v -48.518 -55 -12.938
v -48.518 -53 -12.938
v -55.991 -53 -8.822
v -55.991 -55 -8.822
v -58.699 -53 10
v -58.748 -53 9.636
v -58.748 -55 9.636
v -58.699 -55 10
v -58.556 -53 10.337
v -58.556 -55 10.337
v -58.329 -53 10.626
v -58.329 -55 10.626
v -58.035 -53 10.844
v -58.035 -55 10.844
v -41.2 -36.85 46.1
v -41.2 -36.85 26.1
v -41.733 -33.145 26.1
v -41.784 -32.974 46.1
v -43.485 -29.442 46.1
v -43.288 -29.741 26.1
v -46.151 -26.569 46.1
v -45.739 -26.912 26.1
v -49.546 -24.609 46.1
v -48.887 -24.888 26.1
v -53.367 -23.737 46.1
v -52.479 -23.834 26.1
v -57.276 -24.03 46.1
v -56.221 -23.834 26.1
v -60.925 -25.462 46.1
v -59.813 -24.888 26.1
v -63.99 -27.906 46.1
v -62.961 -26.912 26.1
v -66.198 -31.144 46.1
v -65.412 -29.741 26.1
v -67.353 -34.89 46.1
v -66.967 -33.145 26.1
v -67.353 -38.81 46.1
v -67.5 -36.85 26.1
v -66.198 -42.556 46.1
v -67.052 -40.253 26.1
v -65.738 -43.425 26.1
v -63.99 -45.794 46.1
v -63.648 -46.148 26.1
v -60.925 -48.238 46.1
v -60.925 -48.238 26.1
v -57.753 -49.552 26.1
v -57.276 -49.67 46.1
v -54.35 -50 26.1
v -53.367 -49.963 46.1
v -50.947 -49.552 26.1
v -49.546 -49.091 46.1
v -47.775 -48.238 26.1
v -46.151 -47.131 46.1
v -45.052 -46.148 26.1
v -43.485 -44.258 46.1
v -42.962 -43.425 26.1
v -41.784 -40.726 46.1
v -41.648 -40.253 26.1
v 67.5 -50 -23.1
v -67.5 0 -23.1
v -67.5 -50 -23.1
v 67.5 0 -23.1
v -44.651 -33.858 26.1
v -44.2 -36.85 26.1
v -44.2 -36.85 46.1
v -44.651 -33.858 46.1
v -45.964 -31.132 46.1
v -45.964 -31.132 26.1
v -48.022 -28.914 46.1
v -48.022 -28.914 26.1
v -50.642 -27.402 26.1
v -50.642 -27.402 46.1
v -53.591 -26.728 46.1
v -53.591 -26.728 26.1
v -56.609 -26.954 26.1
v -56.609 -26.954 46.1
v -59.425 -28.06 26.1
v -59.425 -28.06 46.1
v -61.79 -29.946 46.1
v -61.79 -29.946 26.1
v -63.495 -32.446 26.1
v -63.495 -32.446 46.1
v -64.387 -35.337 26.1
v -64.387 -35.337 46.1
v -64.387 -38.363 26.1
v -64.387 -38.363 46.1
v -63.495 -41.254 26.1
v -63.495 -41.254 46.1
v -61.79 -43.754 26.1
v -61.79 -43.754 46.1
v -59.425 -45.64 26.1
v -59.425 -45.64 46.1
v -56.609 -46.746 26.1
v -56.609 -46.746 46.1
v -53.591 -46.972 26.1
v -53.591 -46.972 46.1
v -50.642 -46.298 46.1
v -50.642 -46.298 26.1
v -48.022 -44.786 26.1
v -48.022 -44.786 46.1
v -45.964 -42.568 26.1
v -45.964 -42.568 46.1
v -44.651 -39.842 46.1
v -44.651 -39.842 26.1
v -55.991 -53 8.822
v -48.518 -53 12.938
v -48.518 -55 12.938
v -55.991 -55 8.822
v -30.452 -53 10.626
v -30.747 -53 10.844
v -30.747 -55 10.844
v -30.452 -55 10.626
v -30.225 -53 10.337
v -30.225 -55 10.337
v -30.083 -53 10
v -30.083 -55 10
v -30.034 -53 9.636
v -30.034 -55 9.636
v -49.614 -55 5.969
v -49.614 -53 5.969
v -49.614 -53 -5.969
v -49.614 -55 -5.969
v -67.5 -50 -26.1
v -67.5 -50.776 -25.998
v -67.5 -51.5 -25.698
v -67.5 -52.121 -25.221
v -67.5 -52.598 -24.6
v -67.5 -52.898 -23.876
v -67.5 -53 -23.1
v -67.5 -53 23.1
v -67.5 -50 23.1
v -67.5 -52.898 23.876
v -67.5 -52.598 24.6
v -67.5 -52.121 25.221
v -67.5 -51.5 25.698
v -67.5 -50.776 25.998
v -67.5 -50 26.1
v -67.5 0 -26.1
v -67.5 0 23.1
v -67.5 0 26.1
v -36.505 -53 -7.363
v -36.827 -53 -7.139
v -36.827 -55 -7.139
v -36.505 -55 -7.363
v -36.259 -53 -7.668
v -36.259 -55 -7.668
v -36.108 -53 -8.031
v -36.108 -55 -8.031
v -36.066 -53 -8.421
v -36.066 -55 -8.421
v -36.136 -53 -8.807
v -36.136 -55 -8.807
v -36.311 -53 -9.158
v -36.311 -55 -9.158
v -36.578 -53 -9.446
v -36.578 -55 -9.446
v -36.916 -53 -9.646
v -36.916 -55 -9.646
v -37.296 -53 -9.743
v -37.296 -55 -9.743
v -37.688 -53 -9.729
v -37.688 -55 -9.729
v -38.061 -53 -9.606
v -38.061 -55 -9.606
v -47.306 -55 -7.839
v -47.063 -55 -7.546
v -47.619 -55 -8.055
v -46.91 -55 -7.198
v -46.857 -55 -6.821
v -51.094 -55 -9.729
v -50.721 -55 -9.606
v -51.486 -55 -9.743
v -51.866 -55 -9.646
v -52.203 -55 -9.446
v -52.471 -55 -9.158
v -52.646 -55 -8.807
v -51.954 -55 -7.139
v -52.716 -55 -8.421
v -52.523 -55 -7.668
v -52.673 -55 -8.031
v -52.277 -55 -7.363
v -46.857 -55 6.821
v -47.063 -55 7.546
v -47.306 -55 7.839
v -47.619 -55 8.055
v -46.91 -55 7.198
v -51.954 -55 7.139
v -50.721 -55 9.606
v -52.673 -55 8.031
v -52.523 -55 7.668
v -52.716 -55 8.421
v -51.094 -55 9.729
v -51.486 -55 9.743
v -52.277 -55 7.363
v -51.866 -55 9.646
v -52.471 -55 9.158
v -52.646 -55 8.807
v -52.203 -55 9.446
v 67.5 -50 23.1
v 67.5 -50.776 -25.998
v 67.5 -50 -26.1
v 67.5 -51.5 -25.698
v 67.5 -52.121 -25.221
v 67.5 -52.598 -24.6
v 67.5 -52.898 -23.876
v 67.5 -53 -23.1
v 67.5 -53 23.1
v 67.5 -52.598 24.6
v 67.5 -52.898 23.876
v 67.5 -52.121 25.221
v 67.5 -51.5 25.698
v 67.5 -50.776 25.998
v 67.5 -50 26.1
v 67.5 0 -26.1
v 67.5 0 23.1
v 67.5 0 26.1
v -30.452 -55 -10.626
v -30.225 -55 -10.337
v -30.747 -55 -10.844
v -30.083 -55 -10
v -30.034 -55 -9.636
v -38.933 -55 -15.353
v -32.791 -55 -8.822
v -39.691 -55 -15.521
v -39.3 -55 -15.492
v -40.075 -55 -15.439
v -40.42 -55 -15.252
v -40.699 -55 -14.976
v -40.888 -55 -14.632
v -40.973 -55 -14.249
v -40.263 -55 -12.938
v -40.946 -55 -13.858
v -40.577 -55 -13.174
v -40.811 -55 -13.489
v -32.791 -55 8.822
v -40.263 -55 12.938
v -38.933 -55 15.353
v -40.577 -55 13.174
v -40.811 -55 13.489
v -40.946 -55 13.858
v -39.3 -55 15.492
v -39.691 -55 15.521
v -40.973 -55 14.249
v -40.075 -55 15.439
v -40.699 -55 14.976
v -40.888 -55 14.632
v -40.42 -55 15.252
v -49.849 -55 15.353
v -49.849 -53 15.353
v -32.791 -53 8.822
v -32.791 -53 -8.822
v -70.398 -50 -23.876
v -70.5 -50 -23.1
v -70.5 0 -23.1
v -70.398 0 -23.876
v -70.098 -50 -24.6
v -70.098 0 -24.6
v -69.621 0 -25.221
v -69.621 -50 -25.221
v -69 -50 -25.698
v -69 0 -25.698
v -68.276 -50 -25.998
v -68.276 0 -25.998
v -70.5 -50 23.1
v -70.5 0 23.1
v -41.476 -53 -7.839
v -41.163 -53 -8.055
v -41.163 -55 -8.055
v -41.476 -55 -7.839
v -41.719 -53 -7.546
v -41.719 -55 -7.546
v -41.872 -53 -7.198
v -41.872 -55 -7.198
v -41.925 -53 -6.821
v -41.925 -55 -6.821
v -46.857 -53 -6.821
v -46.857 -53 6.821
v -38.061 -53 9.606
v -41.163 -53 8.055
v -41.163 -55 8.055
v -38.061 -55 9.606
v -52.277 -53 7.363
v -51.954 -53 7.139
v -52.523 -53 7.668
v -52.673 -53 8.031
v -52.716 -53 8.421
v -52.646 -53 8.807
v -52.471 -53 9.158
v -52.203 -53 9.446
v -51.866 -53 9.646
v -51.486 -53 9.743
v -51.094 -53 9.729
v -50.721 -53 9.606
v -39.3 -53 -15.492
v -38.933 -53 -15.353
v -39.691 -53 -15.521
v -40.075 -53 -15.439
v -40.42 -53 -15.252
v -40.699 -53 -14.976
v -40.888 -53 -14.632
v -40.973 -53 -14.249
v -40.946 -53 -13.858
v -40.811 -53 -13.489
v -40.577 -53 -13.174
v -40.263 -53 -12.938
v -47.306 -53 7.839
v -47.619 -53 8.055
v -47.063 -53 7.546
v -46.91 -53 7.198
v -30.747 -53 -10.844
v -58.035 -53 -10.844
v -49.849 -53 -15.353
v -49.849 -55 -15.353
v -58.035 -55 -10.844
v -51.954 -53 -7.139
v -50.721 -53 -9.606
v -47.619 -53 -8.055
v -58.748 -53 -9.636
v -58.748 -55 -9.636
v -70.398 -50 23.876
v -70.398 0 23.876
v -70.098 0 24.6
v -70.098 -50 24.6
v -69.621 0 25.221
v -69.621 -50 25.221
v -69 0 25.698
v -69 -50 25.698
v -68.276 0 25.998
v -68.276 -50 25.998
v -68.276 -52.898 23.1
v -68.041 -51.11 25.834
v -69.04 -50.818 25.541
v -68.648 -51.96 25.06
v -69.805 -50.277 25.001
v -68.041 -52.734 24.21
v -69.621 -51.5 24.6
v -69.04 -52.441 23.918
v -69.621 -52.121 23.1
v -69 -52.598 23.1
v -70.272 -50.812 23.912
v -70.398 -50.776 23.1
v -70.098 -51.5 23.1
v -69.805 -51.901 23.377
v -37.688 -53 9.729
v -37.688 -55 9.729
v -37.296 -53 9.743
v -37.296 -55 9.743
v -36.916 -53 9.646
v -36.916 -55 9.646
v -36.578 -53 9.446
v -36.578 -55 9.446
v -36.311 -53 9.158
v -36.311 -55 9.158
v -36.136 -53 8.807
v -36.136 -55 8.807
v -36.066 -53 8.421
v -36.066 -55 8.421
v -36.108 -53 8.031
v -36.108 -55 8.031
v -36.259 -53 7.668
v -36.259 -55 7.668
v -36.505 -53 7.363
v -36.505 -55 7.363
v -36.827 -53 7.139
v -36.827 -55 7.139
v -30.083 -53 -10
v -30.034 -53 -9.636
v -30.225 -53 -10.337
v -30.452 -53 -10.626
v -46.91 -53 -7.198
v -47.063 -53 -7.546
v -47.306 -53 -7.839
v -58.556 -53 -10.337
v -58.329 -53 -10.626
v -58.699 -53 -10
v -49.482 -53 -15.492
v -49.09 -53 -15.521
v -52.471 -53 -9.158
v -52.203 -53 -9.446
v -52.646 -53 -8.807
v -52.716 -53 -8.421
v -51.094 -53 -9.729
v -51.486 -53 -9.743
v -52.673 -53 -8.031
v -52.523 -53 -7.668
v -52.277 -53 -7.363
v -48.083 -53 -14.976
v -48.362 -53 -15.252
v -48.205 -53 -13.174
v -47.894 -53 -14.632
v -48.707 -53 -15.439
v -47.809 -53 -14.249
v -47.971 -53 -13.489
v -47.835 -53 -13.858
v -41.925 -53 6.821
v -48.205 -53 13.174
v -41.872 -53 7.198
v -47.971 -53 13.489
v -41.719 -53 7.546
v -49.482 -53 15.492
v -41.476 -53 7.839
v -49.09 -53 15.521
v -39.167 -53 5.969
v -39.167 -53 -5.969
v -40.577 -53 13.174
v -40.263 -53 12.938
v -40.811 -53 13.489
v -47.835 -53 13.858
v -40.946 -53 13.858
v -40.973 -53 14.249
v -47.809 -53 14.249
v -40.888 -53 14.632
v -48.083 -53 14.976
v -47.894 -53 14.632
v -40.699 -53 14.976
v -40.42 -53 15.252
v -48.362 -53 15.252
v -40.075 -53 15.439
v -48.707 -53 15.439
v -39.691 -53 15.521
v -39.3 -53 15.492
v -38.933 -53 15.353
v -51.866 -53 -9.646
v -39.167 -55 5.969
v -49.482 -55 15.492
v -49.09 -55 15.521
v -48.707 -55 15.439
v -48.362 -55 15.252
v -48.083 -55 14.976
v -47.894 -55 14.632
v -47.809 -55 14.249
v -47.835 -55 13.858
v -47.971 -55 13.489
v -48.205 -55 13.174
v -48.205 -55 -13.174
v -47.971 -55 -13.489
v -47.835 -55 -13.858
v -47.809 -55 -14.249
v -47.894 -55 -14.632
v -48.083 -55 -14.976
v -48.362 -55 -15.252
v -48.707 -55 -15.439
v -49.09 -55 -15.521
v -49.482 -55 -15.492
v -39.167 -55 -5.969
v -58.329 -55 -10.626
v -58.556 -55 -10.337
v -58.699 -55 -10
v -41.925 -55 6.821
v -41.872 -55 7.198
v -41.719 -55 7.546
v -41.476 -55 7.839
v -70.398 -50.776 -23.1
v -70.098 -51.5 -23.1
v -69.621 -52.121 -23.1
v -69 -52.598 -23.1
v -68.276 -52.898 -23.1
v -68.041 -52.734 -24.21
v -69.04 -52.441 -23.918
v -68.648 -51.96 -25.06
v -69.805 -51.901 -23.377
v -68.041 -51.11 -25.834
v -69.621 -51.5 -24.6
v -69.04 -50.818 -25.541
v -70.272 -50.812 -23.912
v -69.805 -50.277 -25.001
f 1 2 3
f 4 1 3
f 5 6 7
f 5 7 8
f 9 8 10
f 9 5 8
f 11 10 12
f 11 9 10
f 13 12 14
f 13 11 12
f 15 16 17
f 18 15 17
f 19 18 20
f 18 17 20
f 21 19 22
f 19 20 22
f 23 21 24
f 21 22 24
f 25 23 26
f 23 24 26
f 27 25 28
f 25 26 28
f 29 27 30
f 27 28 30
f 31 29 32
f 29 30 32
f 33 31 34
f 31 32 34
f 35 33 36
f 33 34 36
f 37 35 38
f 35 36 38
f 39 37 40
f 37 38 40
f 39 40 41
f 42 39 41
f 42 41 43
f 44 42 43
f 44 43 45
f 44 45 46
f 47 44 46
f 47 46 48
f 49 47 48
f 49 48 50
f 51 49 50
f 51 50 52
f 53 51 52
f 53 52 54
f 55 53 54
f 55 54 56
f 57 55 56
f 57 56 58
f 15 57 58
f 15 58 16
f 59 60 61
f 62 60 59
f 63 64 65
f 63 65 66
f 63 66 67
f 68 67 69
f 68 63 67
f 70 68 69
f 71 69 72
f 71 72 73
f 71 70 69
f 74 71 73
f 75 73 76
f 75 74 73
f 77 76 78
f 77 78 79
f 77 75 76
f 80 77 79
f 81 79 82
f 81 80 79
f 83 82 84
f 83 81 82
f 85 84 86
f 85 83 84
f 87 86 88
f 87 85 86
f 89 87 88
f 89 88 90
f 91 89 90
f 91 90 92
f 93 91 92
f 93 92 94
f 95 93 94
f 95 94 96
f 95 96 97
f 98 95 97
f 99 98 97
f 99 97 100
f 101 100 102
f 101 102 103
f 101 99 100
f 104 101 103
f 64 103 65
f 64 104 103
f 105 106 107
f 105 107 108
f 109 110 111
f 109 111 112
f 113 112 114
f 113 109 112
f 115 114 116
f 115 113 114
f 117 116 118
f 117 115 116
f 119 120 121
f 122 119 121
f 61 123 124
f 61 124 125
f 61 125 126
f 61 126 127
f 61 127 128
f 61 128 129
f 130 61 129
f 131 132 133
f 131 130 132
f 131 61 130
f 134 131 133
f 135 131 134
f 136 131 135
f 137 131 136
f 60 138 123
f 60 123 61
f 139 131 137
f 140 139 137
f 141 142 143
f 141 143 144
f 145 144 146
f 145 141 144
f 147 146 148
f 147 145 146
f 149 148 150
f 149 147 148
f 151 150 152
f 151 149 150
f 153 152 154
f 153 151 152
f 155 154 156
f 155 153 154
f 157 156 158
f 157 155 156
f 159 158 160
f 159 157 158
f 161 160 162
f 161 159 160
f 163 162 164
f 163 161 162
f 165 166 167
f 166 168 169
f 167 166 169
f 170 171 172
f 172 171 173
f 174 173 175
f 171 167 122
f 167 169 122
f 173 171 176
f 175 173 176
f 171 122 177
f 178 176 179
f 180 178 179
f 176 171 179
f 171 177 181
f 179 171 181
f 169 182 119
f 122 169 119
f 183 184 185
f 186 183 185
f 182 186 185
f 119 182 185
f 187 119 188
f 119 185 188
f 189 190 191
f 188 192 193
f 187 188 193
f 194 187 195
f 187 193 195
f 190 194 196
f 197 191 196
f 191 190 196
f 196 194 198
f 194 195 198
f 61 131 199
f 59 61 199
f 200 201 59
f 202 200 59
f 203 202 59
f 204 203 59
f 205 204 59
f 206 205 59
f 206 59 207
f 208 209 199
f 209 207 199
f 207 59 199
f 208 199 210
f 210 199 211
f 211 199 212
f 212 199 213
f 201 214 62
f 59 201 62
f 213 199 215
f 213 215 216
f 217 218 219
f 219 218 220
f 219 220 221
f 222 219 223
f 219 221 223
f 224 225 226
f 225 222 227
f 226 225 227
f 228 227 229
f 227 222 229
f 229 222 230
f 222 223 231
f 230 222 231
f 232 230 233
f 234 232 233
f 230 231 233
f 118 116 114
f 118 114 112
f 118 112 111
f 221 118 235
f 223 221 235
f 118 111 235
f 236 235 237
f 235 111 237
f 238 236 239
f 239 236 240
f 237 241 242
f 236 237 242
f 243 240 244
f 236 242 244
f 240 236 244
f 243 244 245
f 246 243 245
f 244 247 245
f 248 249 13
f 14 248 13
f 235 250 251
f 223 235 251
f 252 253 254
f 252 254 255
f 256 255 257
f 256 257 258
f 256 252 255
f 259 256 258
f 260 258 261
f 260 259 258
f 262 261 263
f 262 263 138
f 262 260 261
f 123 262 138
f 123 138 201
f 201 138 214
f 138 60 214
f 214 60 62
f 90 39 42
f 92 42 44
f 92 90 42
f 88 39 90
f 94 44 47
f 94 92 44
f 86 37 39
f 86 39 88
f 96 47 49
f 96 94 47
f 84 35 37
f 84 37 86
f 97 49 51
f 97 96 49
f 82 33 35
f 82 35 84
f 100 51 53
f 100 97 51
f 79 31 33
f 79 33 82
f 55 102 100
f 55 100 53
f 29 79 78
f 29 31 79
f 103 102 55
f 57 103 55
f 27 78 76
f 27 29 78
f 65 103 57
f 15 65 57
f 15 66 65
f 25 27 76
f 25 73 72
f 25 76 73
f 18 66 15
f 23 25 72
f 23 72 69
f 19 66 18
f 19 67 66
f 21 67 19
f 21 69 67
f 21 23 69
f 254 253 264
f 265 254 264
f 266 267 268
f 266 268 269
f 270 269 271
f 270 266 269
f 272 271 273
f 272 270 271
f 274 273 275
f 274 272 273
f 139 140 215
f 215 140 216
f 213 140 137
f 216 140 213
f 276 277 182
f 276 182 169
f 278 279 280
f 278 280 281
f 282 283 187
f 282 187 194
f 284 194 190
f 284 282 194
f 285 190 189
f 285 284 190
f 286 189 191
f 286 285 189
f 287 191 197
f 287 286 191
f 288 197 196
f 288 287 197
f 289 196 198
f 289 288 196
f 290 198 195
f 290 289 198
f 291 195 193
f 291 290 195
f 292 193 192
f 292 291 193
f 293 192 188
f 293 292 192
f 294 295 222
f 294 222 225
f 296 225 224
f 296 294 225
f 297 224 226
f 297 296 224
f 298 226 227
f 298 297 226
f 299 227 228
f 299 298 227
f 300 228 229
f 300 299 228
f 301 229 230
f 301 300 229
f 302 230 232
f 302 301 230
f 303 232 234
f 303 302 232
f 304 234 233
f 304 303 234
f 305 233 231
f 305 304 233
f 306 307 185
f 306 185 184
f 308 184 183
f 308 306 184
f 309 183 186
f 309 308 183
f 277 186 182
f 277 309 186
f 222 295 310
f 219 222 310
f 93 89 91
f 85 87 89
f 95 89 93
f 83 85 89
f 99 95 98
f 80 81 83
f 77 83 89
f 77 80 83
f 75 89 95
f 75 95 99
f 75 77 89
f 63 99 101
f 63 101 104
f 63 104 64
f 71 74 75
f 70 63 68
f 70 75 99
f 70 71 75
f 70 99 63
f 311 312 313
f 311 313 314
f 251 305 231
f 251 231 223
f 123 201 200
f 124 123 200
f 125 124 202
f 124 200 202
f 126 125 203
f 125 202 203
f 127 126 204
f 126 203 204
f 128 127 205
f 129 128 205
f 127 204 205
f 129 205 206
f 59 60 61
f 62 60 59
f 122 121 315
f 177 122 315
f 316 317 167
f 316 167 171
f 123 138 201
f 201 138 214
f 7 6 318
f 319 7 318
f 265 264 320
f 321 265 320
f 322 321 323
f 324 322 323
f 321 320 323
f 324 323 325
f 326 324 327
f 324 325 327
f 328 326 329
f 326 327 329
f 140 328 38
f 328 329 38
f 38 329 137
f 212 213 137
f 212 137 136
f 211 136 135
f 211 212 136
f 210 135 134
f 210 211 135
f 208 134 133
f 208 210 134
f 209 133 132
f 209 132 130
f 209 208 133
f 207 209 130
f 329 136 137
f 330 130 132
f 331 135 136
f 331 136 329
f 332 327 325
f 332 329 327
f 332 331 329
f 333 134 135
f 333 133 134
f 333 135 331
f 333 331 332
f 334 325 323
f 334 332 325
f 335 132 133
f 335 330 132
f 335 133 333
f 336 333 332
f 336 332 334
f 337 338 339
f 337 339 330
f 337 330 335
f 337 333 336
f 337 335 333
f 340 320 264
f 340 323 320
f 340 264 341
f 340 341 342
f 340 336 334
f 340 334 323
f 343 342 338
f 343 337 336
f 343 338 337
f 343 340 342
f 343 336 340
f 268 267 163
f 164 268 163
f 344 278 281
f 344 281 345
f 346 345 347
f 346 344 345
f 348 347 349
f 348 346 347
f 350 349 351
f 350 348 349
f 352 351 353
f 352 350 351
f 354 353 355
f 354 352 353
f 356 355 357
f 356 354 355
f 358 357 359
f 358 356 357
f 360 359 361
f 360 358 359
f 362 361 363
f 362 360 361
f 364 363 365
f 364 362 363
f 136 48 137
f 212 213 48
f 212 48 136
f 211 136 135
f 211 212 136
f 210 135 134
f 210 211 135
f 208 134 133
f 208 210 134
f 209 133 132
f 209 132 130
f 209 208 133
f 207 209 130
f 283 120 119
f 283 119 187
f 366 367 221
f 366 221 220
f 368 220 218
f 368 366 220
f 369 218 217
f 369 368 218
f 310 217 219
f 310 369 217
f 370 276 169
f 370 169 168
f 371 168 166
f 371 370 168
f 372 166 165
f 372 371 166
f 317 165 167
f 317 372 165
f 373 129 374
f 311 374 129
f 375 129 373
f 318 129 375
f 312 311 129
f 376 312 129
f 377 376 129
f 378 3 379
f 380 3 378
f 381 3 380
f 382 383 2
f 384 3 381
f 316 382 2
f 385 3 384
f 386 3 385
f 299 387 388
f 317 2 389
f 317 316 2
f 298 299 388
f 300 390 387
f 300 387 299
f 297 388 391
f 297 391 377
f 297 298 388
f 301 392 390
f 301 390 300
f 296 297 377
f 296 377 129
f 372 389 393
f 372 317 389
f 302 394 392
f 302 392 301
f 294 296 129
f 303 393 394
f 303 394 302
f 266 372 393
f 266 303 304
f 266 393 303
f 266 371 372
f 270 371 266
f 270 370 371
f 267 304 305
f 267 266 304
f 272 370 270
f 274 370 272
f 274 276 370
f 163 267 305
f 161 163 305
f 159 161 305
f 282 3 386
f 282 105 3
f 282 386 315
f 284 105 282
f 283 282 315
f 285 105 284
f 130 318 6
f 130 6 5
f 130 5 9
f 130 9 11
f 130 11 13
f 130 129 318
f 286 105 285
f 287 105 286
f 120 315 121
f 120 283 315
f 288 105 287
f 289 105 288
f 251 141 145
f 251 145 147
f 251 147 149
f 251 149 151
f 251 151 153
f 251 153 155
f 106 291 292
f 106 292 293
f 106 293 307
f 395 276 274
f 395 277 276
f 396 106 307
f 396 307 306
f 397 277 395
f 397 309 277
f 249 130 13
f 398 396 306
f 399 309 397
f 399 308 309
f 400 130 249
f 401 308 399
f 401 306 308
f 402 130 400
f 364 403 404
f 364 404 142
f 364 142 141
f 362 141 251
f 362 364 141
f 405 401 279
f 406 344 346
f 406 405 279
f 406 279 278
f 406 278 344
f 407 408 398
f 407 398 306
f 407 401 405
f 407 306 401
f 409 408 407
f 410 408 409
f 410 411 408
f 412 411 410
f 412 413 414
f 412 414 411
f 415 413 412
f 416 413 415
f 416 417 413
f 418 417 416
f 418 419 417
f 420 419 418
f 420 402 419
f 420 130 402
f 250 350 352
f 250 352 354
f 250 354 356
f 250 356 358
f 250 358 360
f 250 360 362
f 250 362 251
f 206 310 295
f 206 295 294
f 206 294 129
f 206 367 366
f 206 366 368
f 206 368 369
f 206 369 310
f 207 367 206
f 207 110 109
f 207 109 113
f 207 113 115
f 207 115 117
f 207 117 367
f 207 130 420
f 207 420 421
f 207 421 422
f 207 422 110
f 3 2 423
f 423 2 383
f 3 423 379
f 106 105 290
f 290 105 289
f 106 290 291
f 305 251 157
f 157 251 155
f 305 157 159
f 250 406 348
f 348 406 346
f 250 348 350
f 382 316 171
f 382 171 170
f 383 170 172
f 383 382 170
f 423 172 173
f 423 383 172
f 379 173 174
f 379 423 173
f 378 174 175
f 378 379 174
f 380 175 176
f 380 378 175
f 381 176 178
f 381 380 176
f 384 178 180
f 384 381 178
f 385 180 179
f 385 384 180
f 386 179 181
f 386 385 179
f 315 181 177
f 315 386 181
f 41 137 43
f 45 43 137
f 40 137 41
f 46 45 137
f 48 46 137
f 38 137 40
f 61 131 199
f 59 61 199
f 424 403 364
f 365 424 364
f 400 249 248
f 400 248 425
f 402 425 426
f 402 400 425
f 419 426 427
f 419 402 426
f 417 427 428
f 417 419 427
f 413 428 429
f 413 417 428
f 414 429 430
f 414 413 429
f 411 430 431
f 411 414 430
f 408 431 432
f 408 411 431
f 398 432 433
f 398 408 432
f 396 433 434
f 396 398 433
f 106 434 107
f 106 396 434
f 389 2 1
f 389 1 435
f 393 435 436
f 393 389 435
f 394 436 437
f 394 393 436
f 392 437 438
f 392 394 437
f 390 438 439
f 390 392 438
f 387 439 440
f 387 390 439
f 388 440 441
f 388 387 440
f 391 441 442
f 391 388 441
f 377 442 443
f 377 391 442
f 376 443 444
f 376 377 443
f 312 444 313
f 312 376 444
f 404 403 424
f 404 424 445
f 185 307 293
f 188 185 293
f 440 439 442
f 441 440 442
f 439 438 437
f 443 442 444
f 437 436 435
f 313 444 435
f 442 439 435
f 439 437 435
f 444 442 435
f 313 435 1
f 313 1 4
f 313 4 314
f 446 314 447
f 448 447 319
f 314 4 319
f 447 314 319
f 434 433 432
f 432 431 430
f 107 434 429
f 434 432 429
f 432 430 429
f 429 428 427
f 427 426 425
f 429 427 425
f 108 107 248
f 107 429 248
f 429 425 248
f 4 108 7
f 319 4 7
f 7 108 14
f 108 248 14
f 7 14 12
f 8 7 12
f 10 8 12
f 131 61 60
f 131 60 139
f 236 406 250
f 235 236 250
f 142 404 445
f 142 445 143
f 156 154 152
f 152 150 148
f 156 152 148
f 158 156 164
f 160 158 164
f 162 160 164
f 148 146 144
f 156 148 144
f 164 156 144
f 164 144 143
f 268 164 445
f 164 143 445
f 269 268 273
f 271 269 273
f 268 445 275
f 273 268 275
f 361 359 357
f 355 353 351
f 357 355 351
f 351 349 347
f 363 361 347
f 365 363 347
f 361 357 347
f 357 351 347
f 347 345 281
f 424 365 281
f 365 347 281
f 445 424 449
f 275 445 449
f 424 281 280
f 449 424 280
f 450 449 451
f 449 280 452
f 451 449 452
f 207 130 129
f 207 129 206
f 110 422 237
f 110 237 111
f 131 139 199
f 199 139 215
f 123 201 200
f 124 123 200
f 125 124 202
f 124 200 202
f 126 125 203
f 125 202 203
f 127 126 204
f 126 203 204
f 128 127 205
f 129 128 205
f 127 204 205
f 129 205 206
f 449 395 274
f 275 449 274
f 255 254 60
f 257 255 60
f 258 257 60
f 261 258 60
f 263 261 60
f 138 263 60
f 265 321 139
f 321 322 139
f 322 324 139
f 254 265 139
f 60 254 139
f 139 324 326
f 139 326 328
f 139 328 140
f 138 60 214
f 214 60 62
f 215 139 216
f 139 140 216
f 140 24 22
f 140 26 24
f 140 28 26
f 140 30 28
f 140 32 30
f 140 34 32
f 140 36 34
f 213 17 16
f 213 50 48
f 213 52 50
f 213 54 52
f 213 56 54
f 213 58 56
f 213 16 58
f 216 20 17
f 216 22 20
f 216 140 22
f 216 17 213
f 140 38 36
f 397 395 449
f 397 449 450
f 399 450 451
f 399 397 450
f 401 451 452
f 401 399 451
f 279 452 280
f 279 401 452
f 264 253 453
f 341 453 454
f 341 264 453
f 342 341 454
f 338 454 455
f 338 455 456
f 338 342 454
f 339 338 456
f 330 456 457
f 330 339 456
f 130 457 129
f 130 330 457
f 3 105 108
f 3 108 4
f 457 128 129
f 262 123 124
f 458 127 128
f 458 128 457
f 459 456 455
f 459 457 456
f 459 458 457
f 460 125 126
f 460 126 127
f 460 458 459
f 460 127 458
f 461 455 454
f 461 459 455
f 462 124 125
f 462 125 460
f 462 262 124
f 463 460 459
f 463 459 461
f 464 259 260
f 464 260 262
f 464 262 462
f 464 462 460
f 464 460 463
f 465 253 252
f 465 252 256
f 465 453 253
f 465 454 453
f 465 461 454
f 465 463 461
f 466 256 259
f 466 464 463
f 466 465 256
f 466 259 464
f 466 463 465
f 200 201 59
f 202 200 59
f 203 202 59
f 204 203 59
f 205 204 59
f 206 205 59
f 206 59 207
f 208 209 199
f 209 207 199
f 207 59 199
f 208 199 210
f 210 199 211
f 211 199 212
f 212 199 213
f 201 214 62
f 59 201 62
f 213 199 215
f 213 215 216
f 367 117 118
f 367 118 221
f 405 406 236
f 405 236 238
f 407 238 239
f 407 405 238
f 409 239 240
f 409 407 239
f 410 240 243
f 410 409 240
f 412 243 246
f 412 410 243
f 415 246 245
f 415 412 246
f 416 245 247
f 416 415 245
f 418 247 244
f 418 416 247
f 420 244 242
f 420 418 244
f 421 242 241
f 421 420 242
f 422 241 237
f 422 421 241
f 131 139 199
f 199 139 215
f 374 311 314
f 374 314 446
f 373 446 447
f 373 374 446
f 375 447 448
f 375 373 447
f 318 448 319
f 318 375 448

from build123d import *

# Parameters (mm, degrees)
SKETCH_W       = 135
SKETCH_H       = 46.2
PAD_DEPTH      = 50
THICKNESS_T    = 3
SKETCH001_R    = 13.15
SKETCH001_R_2  = 10.15
PAD001_DEPTH   = 20
PAD002_DEPTH   = 2
SKETCH003_W    = 135
SKETCH003_H    = 46.2
PAD003_DEPTH   = 50
THICKNESS001_T = 3


with BuildPart() as left_section:
    # Sketch → Pad (new body)
    with BuildSketch(Plane.XZ):
        Rectangle(SKETCH_W, SKETCH_H)
    extrude(amount=PAD_DEPTH)

    # Thickness
    thickness_openings = [left_section.faces().sort_by_distance(p)[0] for p in [
        (67.5, -25, 0),
        (0, 0, 0),
    ]]
    offset(amount=THICKNESS_T, openings=thickness_openings)

    # Sketch001 (on Face9 of Thickness) → Pad001 (join)
    with BuildSketch(Plane.XY.offset(26.1)):
        with Locations((-54.35, -36.85)):
            Circle(SKETCH001_R)
        with Locations((-54.35, -36.85)):
            Circle(SKETCH001_R_2, mode=Mode.SUBTRACT)
    extrude(amount=PAD001_DEPTH)

    # Sketch002 (on Face13 of Pad001) → Pad002 (join)
    with BuildSketch(Plane.XZ.offset(53)):
        with BuildLine():
            ThreePointArc((-50.721178, -9.605566), (-52.570827, -8.989015), (-51.954276, -7.139366))
            Line((-49.614418, -5.969439), (-51.954276, -7.139366))
            Line((-49.614418, 5.969439), (-49.614418, -5.969439))
            Line((-49.614418, 5.969439), (-51.954276, 7.139366))
            ThreePointArc((-51.954276, 7.139366), (-52.570827, 8.989015), (-50.721178, 9.605566))
            Line((-47.619222, 8.05459), (-50.721178, 9.605566))
            ThreePointArc((-47.619222, 8.05459), (-47.063024, 7.546288), (-46.857124, 6.82149))
            Line((-46.857124, 6.82149), (-46.857124, -6.82149))
            ThreePointArc((-46.857124, -6.82149), (-47.063024, -7.546288), (-47.619222, -8.05459))
            Line((-47.619222, -8.05459), (-50.721178, -9.605566))
        make_face()
        with BuildLine():
            ThreePointArc((-48.518366, -12.938009), (-47.976054, -14.810769), (-49.848814, -15.353081))
            Line((-49.848814, -15.353081), (-58.034521, -10.843626))
            ThreePointArc((-58.034521, -10.843626), (-58.556263, -10.33736), (-58.747944, -9.63609))
            Line((-58.747944, 9.63609), (-58.747944, -9.63609))
            ThreePointArc((-58.747944, 9.63609), (-58.556263, 10.33736), (-58.034521, 10.843626))
            Line((-49.848814, 15.353081), (-58.034521, 10.843626))
            ThreePointArc((-49.848814, 15.353081), (-47.976054, 14.810769), (-48.518366, 12.938009))
            Line((-48.518366, 12.938009), (-55.99065, 8.821574))
            Line((-55.99065, 8.821574), (-55.99065, -8.821574))
            Line((-48.518366, -12.938009), (-55.99065, -8.821574))
        make_face()
        with BuildLine():
            ThreePointArc((-36.827454, -7.139366), (-36.210903, -8.989015), (-38.060552, -9.605566))
            Line((-41.162508, -8.05459), (-38.060552, -9.605566))
            ThreePointArc((-41.162508, -8.05459), (-41.718706, -7.546288), (-41.924606, -6.82149))
            Line((-41.924606, 6.82149), (-41.924606, -6.82149))
            ThreePointArc((-41.924606, 6.82149), (-41.718706, 7.546288), (-41.162508, 8.05459))
            Line((-41.162508, 8.05459), (-38.060552, 9.605566))
            ThreePointArc((-38.060552, 9.605566), (-36.210903, 8.989015), (-36.827454, 7.139366))
            Line((-39.167312, 5.969439), (-36.827454, 7.139366))
            Line((-39.167312, 5.969439), (-39.167312, -5.969439))
            Line((-39.167312, -5.969439), (-36.827454, -7.139366))
        make_face()
        with BuildLine():
            ThreePointArc((-38.932916, -15.353081), (-40.805676, -14.810769), (-40.263364, -12.938009))
            Line((-40.263364, -12.938009), (-32.79108, -8.821574))
            Line((-32.79108, 8.821574), (-32.79108, -8.821574))
            Line((-40.263364, 12.938009), (-32.79108, 8.821574))
            ThreePointArc((-40.263364, 12.938009), (-40.805676, 14.810769), (-38.932916, 15.353081))
            Line((-38.932916, 15.353081), (-30.747209, 10.843626))
            ThreePointArc((-30.747209, 10.843626), (-30.225467, 10.33736), (-30.033786, 9.63609))
            Line((-30.033786, 9.63609), (-30.033786, -9.63609))
            ThreePointArc((-30.033786, -9.63609), (-30.225467, -10.33736), (-30.747209, -10.843626))
            Line((-38.932916, -15.353081), (-30.747209, -10.843626))
        make_face()
    extrude(amount=PAD002_DEPTH)


with BuildPart() as mid_section:
    # Sketch003 → Pad003 (new body)
    with BuildSketch(Plane.XZ):
        Rectangle(SKETCH003_W, SKETCH003_H)
    extrude(amount=PAD003_DEPTH)

    # Thickness001
    thickness001_openings = [mid_section.faces().sort_by_distance(p)[0] for p in [
        (67.5, -25, 0),
        (0, 0, 0),
        (-67.5, -25, 0),
    ]]
    offset(amount=THICKNESS001_T, openings=thickness001_openings)


solid = Compound([left_section.part, mid_section.part])
